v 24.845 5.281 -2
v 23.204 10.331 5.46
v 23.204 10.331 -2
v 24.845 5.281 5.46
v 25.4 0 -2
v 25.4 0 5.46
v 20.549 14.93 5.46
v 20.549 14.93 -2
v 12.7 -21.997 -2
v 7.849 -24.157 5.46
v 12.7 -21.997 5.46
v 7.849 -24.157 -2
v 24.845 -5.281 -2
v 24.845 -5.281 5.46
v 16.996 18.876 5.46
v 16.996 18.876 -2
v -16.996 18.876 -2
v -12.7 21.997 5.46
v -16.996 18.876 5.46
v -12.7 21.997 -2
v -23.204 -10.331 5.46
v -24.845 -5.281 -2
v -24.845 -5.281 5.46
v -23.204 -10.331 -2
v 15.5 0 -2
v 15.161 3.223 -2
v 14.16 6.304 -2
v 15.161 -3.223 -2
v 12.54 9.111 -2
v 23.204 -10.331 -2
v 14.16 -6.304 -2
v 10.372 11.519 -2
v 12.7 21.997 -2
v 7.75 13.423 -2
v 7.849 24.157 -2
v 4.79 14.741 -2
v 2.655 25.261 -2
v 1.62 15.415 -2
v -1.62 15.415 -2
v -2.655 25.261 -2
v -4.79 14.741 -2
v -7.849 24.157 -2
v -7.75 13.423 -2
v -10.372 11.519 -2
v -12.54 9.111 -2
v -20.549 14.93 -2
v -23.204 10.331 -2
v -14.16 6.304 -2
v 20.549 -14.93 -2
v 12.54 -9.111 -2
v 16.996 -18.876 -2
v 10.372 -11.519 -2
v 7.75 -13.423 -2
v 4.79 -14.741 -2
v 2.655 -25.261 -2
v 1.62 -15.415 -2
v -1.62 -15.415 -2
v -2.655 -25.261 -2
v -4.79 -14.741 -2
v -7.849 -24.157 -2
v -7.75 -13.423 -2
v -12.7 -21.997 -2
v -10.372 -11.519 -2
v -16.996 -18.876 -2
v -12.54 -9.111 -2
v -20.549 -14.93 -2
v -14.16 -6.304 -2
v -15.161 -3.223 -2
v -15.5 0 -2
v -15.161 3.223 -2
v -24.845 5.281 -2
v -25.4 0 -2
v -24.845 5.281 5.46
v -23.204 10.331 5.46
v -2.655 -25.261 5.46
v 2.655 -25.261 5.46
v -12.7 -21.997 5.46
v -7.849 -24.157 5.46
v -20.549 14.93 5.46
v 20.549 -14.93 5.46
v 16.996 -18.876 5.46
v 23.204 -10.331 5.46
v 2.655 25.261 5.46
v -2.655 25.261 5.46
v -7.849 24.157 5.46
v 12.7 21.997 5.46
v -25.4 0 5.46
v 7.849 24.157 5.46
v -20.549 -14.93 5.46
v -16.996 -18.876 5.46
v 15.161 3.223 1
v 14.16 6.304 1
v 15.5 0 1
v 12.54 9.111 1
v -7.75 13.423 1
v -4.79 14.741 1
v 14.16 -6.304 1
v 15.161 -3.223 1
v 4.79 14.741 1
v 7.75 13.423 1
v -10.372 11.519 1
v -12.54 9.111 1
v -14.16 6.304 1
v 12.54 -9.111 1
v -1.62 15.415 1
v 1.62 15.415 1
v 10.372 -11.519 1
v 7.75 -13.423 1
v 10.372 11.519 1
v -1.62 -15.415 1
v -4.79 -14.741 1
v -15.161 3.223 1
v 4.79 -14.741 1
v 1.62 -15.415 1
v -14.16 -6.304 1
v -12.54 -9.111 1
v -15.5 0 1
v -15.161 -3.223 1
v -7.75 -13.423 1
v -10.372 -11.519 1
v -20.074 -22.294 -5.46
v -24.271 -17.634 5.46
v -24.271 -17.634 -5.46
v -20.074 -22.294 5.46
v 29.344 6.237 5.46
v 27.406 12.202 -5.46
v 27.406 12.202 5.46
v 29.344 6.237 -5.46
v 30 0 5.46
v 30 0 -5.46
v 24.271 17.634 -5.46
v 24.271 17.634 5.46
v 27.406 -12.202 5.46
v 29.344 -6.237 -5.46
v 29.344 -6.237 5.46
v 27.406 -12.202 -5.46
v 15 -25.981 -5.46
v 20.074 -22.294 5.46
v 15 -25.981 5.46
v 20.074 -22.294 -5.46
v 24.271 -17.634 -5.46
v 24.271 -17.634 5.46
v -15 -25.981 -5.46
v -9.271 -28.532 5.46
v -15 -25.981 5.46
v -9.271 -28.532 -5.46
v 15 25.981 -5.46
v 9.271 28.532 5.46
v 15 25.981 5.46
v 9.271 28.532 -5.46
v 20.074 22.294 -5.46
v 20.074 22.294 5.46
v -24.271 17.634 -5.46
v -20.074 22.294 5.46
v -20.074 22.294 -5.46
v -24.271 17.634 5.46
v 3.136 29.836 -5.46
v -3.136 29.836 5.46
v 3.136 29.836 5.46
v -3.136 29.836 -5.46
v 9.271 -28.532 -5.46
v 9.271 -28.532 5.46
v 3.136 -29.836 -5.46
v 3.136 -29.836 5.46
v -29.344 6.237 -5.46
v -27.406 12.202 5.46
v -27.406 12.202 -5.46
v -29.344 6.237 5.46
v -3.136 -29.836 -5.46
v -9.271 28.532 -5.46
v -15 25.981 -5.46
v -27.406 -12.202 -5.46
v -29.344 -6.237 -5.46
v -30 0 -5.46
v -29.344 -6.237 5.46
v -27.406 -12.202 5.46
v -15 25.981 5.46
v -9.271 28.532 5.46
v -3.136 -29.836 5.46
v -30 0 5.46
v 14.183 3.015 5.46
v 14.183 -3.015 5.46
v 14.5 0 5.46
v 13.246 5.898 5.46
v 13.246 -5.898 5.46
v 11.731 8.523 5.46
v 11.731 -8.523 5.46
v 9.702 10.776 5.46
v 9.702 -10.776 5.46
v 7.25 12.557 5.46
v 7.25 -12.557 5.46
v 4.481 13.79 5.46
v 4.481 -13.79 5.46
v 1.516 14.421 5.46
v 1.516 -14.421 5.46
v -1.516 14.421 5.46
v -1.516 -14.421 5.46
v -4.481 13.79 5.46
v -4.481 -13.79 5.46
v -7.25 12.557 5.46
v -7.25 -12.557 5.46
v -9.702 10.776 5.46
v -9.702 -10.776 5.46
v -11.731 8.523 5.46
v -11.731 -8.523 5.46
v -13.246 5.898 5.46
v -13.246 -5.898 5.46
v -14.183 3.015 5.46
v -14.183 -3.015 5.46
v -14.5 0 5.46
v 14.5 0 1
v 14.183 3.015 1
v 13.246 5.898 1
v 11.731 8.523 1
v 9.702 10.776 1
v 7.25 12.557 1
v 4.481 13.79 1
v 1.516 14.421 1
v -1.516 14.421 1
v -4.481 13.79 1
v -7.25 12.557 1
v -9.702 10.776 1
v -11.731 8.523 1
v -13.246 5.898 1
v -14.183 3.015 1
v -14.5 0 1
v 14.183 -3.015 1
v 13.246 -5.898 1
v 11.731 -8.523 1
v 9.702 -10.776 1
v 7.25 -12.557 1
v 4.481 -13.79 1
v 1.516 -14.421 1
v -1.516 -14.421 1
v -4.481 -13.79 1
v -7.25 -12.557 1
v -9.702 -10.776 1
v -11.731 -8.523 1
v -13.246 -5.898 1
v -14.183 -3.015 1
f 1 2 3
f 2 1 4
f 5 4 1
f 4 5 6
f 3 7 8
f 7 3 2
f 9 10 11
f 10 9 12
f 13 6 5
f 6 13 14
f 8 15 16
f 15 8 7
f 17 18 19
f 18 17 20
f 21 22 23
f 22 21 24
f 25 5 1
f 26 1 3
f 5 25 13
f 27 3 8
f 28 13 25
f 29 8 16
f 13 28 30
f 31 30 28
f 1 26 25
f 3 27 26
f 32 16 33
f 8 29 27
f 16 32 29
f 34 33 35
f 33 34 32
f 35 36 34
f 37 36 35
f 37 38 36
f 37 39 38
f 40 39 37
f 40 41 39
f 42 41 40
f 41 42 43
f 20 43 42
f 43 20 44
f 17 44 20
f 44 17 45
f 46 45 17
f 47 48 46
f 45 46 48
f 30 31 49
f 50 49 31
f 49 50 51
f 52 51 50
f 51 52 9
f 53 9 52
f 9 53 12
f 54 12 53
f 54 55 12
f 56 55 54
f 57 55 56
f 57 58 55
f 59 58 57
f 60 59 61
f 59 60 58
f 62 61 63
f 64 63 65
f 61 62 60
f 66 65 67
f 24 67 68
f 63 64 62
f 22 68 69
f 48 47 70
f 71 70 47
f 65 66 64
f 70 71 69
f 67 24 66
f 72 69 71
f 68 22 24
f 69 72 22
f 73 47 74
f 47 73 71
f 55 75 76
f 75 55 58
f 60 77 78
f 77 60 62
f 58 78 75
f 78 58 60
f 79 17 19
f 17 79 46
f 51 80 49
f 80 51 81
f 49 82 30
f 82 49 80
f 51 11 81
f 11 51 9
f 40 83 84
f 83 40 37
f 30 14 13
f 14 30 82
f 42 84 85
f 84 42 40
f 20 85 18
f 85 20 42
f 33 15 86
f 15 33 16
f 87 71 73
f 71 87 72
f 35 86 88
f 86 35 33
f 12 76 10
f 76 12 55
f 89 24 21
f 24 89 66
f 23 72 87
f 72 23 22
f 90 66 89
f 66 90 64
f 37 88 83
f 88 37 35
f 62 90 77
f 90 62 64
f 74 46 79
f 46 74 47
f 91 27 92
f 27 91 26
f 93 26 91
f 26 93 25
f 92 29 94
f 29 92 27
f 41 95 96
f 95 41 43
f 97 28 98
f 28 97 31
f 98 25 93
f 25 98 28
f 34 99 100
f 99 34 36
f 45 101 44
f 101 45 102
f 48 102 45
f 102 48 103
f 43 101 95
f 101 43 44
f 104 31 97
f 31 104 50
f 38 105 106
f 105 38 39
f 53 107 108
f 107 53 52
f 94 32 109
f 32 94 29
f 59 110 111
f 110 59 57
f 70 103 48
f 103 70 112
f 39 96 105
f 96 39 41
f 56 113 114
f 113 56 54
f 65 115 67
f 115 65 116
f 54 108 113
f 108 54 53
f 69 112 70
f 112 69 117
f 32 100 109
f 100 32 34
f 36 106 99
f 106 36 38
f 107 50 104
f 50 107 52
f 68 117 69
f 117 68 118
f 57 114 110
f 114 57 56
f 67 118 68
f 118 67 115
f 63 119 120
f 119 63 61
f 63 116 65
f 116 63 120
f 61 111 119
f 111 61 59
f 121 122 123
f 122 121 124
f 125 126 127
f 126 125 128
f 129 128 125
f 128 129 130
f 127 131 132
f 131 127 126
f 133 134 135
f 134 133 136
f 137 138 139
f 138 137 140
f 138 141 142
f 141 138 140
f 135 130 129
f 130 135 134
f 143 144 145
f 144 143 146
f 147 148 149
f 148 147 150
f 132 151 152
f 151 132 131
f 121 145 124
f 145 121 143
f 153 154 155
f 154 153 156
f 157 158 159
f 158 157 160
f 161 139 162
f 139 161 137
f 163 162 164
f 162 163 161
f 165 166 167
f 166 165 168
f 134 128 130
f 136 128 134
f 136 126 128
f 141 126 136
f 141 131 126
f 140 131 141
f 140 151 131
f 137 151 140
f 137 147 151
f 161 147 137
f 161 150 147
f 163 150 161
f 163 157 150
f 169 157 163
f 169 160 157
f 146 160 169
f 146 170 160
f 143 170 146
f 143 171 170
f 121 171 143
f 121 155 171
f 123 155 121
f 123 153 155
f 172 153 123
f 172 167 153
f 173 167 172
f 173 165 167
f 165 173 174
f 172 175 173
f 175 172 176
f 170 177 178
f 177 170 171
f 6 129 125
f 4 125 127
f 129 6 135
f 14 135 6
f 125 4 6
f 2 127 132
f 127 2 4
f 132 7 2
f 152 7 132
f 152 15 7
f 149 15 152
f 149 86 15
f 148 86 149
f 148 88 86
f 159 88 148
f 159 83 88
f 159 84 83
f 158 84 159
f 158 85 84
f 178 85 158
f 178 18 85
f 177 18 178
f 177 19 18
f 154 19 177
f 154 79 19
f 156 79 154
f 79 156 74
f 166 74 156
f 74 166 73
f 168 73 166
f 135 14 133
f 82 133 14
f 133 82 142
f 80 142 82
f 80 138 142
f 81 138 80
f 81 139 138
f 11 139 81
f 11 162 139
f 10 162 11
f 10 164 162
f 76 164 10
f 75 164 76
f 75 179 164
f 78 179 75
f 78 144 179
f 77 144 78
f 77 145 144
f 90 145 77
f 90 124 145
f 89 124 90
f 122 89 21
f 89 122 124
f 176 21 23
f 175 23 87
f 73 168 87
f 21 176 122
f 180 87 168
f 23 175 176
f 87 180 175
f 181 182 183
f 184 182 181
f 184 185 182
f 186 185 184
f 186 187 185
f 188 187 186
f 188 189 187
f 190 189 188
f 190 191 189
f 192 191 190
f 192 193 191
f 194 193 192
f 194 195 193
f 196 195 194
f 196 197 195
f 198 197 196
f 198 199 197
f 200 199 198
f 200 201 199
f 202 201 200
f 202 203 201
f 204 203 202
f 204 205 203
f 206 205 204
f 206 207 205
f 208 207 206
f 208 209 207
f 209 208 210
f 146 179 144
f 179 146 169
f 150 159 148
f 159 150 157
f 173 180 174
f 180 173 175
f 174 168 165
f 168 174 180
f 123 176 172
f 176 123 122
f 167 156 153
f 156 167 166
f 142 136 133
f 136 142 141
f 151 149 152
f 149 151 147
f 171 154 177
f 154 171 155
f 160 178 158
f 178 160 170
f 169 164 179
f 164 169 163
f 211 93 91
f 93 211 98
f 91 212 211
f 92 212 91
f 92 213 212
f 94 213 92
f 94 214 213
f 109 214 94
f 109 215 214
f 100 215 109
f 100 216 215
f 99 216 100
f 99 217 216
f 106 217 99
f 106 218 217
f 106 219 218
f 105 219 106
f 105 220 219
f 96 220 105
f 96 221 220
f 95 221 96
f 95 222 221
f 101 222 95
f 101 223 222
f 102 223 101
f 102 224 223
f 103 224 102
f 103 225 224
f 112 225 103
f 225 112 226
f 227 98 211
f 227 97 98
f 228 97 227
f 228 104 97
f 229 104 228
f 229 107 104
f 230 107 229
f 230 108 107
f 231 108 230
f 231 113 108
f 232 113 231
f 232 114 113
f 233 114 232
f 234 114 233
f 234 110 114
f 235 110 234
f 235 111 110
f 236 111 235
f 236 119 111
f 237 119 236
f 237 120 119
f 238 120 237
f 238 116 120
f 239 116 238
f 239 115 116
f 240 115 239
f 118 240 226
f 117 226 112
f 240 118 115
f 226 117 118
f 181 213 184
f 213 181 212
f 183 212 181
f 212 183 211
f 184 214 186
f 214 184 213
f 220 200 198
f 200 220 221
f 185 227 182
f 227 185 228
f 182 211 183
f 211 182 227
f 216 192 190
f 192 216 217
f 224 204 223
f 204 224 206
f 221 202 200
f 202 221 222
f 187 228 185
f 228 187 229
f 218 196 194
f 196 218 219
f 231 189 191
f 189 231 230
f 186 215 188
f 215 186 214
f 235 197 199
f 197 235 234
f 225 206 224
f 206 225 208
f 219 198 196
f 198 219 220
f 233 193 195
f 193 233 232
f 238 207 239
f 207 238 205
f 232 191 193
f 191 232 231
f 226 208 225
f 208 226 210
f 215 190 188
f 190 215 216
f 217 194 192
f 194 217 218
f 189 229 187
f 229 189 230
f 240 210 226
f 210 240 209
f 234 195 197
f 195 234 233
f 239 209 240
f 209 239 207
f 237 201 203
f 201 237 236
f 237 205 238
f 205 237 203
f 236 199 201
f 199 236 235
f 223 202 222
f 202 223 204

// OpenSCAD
 
difference()
  {
  difference()
    {
        cylinder(h=10.92, r1=30, r2=30,center=true);
        translate([0,0,13]) {
        difference()
            {
            cylinder(30,r1=25.4,r2=25.4,center=true);
            cylinder(60,r1=15.5,r2=15.5,center=true);   
            }
        }
}
   translate([0,0,22]) {
  difference()
 {
    cylinder(42,r1=25.4,r2=25.4,center=true);
    cylinder(60,r1=14.5,r2=14.5,center=true);   
 }
}
}




 
 
 
